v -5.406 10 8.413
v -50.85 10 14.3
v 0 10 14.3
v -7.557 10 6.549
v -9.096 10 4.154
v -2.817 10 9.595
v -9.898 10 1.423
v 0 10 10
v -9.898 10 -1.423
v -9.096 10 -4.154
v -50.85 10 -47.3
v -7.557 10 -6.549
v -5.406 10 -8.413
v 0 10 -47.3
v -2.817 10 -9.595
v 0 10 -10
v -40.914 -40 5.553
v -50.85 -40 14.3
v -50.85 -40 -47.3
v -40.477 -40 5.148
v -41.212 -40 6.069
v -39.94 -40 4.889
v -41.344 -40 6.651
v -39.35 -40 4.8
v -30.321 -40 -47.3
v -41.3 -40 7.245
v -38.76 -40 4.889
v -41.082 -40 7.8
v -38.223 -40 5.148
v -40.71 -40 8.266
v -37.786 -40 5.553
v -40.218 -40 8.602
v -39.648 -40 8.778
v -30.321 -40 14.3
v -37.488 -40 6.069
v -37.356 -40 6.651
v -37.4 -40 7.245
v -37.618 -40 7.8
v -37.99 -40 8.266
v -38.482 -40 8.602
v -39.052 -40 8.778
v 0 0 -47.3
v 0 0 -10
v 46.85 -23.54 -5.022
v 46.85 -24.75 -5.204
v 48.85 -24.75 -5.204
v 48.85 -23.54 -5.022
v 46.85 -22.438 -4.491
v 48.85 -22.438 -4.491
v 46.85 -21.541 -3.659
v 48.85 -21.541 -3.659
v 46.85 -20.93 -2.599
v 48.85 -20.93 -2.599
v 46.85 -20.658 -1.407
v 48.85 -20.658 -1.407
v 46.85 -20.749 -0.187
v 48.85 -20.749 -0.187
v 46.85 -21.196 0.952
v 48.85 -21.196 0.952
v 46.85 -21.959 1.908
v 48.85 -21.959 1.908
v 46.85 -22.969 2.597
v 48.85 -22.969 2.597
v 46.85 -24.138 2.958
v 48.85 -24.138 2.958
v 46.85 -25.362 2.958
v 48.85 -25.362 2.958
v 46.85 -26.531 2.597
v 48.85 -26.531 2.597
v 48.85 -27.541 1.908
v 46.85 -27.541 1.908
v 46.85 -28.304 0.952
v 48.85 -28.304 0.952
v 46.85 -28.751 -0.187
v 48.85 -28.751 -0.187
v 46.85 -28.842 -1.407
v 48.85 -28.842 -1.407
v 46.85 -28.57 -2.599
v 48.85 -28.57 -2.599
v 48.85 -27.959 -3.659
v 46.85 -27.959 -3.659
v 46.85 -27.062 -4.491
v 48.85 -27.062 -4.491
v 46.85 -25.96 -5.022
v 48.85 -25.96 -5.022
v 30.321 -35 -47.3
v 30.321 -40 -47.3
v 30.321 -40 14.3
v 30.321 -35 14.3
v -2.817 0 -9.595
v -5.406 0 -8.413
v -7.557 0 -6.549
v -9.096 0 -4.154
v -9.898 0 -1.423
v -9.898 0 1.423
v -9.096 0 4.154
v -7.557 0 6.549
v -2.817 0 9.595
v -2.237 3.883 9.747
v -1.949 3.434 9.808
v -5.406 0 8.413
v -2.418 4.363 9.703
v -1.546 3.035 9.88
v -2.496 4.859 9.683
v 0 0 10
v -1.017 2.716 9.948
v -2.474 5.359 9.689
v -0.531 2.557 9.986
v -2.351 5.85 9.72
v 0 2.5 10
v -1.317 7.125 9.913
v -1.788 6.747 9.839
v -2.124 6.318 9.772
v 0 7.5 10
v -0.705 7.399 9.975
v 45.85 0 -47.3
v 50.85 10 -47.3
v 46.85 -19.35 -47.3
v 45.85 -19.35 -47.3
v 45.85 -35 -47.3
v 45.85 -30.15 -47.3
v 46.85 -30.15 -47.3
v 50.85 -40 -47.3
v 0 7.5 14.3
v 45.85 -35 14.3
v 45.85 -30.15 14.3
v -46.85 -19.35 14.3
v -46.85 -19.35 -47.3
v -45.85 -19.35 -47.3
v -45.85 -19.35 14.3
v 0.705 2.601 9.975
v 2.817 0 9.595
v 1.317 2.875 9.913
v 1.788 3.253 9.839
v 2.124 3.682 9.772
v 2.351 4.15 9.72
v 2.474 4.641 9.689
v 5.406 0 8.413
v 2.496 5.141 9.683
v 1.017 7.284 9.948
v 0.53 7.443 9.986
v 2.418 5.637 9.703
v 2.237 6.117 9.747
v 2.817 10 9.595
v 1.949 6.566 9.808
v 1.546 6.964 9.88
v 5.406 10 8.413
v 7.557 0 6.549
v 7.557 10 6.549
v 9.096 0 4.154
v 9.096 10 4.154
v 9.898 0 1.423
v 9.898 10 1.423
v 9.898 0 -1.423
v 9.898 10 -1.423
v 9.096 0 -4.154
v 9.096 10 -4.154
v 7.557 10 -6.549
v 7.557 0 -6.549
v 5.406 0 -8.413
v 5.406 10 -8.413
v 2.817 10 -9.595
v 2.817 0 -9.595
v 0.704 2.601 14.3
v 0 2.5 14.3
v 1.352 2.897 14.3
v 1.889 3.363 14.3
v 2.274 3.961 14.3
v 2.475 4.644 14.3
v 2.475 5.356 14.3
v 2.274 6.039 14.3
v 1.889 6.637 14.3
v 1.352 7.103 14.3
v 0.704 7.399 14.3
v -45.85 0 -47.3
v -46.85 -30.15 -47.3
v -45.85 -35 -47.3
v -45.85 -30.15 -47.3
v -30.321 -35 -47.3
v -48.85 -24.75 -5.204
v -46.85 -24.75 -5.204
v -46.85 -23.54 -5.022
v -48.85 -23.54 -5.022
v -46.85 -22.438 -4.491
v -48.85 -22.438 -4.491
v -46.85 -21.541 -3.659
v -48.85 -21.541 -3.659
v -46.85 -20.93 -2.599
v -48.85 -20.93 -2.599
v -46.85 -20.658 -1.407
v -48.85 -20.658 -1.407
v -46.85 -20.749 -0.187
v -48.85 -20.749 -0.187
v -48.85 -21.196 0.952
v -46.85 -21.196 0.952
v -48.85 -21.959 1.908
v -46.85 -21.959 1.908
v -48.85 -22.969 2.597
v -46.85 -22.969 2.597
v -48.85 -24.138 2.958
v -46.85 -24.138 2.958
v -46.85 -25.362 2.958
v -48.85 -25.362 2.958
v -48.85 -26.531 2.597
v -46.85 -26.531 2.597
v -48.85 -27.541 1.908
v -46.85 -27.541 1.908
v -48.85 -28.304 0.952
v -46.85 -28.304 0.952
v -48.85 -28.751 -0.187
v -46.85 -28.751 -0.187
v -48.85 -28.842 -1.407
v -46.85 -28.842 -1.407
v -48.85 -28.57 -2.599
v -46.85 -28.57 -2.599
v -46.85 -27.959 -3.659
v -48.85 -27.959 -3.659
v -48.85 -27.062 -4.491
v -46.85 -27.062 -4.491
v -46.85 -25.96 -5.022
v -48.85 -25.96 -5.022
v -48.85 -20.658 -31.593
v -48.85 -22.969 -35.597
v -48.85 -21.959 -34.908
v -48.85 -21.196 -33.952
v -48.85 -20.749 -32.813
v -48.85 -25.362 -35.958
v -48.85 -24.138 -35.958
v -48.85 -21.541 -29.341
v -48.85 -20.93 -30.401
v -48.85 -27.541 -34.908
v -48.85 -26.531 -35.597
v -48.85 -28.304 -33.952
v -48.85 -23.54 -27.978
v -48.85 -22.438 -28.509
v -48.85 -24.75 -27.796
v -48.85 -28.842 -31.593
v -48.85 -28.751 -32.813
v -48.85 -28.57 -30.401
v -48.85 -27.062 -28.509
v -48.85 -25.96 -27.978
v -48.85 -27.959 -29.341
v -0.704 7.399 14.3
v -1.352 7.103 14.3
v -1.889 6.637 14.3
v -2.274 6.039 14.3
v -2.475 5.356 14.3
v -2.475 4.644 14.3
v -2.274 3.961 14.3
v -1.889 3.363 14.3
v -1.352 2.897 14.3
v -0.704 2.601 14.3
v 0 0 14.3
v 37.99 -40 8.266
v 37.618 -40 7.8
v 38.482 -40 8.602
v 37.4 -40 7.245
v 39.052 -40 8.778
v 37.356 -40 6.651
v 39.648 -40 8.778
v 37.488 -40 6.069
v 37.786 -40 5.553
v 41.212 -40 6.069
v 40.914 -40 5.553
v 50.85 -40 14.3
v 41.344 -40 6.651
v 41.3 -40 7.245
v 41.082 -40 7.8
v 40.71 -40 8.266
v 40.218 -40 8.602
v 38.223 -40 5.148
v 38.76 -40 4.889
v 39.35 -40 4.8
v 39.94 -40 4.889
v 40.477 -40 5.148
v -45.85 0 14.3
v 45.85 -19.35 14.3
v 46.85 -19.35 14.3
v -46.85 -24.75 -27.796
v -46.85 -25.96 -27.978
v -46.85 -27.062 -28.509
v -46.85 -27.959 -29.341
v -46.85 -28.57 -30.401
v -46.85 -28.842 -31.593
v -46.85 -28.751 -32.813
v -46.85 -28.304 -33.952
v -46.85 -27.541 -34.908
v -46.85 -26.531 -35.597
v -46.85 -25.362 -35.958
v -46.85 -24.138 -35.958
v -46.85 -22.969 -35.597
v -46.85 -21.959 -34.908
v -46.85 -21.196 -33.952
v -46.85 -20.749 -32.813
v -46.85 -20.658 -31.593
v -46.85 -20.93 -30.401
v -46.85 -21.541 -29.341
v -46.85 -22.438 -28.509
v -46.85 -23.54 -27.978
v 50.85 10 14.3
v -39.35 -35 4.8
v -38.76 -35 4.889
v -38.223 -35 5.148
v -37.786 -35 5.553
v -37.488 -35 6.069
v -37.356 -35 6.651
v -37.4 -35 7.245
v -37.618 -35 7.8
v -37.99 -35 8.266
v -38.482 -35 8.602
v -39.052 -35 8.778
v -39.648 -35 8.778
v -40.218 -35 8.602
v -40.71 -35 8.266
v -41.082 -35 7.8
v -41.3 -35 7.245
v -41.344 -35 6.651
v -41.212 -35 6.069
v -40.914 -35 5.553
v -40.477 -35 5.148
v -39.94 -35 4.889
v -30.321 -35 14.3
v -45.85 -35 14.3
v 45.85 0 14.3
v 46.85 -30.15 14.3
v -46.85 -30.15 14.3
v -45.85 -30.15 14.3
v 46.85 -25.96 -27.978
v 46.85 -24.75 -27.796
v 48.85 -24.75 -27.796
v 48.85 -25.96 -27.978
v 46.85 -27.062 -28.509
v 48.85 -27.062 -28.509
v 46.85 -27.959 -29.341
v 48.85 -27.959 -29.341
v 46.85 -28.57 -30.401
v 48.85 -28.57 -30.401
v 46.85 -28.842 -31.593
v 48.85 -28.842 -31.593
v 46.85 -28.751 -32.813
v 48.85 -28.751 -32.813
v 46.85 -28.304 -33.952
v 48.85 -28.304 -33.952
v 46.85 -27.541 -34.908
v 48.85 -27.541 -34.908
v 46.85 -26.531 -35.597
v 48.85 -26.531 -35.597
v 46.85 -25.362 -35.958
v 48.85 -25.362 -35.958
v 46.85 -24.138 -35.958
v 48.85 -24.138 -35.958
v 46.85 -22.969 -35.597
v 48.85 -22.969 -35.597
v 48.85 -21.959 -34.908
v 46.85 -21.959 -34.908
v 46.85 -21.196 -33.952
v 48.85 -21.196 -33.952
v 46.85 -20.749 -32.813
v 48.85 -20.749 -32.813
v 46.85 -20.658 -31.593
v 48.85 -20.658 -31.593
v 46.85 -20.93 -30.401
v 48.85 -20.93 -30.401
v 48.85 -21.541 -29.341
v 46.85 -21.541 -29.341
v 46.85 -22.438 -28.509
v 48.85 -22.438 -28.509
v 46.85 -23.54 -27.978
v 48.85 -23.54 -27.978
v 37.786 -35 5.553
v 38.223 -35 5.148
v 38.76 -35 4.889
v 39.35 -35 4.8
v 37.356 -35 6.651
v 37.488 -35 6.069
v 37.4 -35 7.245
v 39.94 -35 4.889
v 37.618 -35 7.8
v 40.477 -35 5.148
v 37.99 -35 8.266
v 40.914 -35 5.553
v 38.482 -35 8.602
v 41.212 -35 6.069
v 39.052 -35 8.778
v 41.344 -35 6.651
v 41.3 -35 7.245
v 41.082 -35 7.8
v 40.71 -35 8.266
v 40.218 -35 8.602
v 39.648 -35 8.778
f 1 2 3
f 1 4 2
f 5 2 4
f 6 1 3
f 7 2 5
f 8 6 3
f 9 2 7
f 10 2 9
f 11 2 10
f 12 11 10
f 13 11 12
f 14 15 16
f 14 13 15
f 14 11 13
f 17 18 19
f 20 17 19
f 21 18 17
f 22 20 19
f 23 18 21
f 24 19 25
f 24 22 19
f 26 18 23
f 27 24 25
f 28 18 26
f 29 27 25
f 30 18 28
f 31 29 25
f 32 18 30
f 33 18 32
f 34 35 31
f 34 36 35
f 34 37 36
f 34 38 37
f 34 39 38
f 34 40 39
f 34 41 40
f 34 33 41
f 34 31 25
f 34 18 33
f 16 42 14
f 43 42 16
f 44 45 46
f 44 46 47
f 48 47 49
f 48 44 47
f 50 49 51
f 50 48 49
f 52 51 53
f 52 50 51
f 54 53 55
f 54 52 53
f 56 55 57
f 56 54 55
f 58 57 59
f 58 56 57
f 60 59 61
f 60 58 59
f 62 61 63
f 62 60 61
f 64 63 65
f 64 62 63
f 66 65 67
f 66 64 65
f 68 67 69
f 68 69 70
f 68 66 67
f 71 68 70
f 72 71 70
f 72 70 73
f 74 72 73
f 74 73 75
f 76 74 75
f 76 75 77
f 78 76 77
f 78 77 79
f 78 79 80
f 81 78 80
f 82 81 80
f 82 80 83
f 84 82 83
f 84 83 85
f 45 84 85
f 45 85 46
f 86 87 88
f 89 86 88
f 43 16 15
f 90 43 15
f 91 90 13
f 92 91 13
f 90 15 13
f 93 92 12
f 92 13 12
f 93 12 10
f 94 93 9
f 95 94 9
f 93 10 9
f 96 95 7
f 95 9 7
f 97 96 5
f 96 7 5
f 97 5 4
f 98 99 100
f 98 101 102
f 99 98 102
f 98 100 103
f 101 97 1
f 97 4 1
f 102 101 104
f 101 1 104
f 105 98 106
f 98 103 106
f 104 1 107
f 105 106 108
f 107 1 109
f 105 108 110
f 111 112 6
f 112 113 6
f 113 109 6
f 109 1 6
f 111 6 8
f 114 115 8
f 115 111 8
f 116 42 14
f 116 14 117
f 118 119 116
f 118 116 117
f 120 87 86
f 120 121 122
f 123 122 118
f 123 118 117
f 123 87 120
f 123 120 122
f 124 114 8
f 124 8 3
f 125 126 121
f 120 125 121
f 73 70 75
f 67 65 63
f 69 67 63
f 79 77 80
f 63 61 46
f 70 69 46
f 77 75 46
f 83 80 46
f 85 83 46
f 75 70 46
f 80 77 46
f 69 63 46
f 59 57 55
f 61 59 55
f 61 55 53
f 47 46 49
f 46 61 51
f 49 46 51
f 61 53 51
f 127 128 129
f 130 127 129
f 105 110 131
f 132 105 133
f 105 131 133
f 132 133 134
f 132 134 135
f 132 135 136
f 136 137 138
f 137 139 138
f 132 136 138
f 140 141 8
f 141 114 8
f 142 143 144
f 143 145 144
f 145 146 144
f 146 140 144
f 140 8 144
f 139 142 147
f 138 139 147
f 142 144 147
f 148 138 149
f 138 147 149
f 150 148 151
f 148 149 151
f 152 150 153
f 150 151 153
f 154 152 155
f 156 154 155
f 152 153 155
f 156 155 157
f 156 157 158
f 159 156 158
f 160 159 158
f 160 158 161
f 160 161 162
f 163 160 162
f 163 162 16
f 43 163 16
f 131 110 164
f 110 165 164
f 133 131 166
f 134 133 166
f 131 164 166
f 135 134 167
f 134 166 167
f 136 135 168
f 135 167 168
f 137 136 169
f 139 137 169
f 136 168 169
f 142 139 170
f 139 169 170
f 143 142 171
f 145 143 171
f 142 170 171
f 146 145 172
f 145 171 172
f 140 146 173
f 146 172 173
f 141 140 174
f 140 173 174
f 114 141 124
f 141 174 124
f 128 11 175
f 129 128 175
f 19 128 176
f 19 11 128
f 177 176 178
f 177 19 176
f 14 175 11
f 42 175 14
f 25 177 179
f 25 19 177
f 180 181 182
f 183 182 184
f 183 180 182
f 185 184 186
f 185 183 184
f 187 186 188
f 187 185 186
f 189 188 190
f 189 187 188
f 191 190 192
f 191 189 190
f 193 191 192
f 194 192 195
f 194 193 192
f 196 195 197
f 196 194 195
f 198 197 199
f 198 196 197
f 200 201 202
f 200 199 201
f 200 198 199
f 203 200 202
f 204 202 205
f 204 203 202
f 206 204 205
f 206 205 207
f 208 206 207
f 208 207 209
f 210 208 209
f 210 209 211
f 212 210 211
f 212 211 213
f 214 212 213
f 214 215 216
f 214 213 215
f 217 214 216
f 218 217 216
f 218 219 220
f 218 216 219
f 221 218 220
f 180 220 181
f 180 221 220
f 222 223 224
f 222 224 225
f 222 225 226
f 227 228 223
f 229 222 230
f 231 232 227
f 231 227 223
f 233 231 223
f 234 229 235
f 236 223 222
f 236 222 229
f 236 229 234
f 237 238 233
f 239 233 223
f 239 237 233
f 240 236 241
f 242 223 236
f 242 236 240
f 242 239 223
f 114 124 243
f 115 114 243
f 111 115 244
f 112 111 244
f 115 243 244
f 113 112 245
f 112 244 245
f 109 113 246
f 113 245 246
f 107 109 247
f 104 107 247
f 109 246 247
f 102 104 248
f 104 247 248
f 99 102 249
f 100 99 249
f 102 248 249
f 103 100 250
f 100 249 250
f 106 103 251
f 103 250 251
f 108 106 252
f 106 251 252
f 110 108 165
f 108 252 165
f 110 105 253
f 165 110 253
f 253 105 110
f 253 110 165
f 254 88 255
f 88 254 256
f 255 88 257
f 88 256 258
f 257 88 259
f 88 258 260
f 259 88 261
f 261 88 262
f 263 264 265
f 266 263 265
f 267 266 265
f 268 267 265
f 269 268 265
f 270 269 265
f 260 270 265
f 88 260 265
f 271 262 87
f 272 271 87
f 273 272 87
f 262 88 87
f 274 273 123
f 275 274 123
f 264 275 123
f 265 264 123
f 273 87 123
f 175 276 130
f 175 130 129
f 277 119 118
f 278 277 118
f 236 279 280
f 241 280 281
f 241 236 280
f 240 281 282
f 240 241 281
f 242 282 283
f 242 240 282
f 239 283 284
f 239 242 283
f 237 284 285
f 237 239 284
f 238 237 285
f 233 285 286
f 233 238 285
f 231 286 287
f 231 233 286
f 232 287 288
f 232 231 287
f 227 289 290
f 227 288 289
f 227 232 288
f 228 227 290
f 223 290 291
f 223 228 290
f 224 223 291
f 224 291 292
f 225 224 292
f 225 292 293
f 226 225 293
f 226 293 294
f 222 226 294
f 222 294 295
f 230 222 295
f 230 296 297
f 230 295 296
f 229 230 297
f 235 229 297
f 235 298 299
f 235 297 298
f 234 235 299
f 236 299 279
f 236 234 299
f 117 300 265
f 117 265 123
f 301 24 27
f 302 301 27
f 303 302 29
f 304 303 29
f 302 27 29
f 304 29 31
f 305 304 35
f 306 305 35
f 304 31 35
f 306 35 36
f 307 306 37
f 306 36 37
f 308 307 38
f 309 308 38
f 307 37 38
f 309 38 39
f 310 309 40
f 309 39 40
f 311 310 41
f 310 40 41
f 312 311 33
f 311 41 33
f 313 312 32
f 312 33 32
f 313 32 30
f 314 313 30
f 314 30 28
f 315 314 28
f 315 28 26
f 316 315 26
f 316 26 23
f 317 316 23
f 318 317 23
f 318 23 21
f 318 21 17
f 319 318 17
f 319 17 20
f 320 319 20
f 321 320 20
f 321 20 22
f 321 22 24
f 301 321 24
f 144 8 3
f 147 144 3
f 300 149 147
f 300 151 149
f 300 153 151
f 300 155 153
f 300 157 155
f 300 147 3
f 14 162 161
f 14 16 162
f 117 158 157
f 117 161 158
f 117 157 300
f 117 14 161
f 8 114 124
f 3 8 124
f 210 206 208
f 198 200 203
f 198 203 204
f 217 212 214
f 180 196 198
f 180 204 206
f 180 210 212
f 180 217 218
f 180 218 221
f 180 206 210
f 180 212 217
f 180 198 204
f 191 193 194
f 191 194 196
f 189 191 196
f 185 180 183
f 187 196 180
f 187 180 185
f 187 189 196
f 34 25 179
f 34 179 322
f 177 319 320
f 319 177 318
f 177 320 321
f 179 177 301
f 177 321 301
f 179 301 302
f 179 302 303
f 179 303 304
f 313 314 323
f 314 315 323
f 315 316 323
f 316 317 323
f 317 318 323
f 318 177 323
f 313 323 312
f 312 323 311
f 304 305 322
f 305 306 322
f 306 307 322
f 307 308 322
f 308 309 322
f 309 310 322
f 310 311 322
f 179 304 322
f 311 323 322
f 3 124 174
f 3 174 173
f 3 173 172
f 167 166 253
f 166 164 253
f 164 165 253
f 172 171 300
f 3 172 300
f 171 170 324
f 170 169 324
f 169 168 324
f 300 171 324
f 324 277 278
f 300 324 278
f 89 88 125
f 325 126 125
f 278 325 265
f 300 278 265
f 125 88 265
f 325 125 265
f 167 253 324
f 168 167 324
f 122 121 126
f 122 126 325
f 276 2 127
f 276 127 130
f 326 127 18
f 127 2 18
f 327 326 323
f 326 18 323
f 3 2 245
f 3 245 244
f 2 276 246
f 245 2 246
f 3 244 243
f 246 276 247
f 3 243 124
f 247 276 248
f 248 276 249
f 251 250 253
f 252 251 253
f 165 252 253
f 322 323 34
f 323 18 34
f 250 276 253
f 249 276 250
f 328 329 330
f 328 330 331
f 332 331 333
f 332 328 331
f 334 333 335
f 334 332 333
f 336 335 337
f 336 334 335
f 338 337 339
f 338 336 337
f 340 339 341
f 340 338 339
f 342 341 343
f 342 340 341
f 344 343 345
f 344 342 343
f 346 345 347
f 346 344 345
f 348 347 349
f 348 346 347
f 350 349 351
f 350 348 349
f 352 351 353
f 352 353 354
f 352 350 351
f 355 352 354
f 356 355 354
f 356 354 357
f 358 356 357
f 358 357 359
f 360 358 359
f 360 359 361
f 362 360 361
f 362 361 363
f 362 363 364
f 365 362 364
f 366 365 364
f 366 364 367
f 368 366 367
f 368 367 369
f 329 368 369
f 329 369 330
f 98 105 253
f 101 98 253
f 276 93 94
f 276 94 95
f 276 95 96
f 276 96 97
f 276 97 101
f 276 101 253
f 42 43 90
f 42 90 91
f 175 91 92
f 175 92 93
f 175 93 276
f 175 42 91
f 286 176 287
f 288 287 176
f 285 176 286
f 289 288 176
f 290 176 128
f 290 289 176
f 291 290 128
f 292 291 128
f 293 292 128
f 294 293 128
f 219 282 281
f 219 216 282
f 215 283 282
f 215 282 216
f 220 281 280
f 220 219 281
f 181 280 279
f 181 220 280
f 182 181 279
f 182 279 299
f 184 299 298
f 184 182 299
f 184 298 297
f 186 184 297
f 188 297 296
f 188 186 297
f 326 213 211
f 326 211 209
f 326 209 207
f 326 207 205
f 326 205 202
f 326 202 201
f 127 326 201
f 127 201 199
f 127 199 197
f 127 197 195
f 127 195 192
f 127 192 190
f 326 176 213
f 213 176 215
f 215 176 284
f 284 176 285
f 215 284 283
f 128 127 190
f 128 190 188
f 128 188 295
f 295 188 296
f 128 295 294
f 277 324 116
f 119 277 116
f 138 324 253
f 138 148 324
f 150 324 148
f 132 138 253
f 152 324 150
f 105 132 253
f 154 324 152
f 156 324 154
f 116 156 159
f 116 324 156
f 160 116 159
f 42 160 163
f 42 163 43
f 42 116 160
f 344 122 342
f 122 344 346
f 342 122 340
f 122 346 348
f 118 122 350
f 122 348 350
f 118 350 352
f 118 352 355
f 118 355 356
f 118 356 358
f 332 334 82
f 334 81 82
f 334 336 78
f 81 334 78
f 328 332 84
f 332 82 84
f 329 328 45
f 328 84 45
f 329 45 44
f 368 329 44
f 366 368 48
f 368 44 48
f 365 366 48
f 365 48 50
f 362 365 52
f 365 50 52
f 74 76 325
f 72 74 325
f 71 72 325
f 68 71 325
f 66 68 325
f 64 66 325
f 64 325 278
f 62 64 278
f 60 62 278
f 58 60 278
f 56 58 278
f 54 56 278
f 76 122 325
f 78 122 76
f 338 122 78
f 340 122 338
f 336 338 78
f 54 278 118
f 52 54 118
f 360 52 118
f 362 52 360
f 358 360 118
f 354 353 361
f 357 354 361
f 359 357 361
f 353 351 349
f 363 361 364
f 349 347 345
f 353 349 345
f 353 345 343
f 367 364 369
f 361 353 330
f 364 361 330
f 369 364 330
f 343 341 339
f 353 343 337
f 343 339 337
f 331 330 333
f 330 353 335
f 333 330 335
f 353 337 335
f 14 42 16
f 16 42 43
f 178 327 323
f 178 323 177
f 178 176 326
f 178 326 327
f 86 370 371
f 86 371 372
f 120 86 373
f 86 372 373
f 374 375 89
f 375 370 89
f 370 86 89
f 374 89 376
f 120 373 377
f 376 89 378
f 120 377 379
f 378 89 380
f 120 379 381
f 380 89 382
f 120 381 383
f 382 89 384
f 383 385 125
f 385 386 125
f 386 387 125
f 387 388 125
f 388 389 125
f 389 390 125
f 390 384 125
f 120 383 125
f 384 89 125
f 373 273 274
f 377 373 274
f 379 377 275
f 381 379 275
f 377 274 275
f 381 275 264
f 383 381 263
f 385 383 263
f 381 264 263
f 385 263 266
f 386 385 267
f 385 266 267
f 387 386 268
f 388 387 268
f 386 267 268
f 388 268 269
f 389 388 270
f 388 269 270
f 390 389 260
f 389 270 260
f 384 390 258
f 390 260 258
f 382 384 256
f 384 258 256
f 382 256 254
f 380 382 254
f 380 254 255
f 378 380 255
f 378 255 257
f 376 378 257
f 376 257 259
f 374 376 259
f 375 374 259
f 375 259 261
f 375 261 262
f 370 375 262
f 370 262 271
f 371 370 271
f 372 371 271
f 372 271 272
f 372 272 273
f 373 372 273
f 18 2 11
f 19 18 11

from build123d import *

# Parameters (mm, degrees)
SALIENTE_EXTRUIR1_DEPTH    = 10
CROQUIS3_R                 = 10
CORTAR_EXTRUIR1_DEPTH      = 10
CROQUIS4_R                 = 2.5
CORTAR_EXTRUIR2_DEPTH      = 10
CROQUIS6_W                 = 5
CROQUIS6_H                 = 61.6
SALIENTE_EXTRUIR2_DEPTH    = 50
CROQUIS7_W                 = 15.529327094
CROQUIS7_H                 = 61.6
SALIENTE_EXTRUIR3_DEPTH    = 5
CROQUIS8_R                 = 2
CORTAR_EXTRUIR3_DEPTH      = 10
CROQUIS9_W                 = 1
CROQUIS9_H                 = 10.8
CORTAR_EXTRUIR4_DEPTH      = 100
CORTAR_EXTRUIR5_DEPTH      = 95.7
CORTAR_EXTRUIR5_DEPTH_BACK = 2
CROQUIS11_R                = 4.103892148


with BuildPart() as part:
    # Croquis1 → Saliente-Extruir1 (new body)
    with BuildSketch(Plane(origin=(0, 0, 0), x_dir=(1, 0, 0), z_dir=(0, 1, 0))):
        Polygon((-45.85, 14.3), (-45.85, 47.3), (45.85, 47.3), (45.85, 14.3), (45.85, -14.3), (-45.85, -14.3), align=None)
    extrude(amount=SALIENTE_EXTRUIR1_DEPTH)

    # Croquis3 → Cortar-Extruir1 (cut)
    with BuildSketch(Plane(origin=(0, 10, 0), x_dir=(1, 0, 0), z_dir=(0, 1, 0))):
        with Locations(Location((0, 0, 0), (0, 0, 270))):
            Circle(CROQUIS3_R)
    extrude(amount=-CORTAR_EXTRUIR1_DEPTH, mode=Mode.SUBTRACT)

    # Croquis4 → Cortar-Extruir2 (cut)
    with BuildSketch(Plane.XY.offset(14.3)):
        with Locations((0, 5)):
            Circle(CROQUIS4_R)
    extrude(amount=-CORTAR_EXTRUIR2_DEPTH, mode=Mode.SUBTRACT)

    # Croquis6 → Saliente-Extruir2 (add)
    with BuildSketch(Plane(origin=(0, 10, 0), x_dir=(1, 0, 0), z_dir=(0, 1, 0))):
        with Locations((-48.35, 16.5)):
            Rectangle(CROQUIS6_W, CROQUIS6_H)
        with Locations((48.35, 16.5)):
            Rectangle(CROQUIS6_W, CROQUIS6_H)
    extrude(amount=-SALIENTE_EXTRUIR2_DEPTH)

    # Croquis7 → Saliente-Extruir3 (add)
    with BuildSketch(Plane.XZ.offset(40)):
        with Locations((-38.085336453, -16.5)):
            Rectangle(CROQUIS7_W, CROQUIS7_H)
        with Locations((38.085336453, -16.5)):
            Rectangle(CROQUIS7_W, CROQUIS7_H)
    extrude(amount=-SALIENTE_EXTRUIR3_DEPTH)

    # Croquis8 → Cortar-Extruir3 (cut)
    with BuildSketch(Plane.XZ.offset(40)):
        with Locations(Location((-39.35, 6.8, 0), (0, 0, 270))):
            Circle(CROQUIS8_R)
        with Locations(Location((39.35, 6.8, 0), (0, 0, 270))):
            Circle(CROQUIS8_R)
    extrude(amount=-CORTAR_EXTRUIR3_DEPTH, mode=Mode.SUBTRACT)

    # Croquis9 → Cortar-Extruir4 (cut)
    with BuildSketch(Plane.XY.offset(14.3)):
        with Locations((-46.35, -24.75)):
            Rectangle(CROQUIS9_W, CROQUIS9_H)
        with Locations((46.35, -24.75)):
            Rectangle(CROQUIS9_W, CROQUIS9_H)
    extrude(amount=-CORTAR_EXTRUIR4_DEPTH, mode=Mode.SUBTRACT)

    # Croquis11 → Cortar-Extruir5 (cut, two sides: drawn at the far end of the back side and taken through both)
    with BuildSketch(Plane(origin=(-46.85, 0, 0), x_dir=(0, 0, -1), z_dir=(1, 0, 0)).offset(-CORTAR_EXTRUIR5_DEPTH_BACK)):
        with Locations((1.1, -24.75)):
            Circle(CROQUIS11_R)
        with Locations(Location((31.9, -24.75, 0), (0, 0, 180))):
            Circle(CROQUIS11_R)
    extrude(amount=CORTAR_EXTRUIR5_DEPTH + CORTAR_EXTRUIR5_DEPTH_BACK, mode=Mode.SUBTRACT)


with BuildPart() as body_2:
    # Partir1: the piece on the far side of the plane
    add(part.part)
    split(bisect_by=Plane(origin=(0, 0, 0), x_dir=(0, 0, 1), z_dir=(1, 0, 0)), keep=Keep.BOTTOM)


with BuildPart() as part_1:
    add(part.part)

    # Partir1
    split(bisect_by=Plane(origin=(0, 0, 0), x_dir=(0, 0, 1), z_dir=(1, 0, 0)), keep=Keep.TOP)


solid = Compound([body_2.part, part_1.part])
